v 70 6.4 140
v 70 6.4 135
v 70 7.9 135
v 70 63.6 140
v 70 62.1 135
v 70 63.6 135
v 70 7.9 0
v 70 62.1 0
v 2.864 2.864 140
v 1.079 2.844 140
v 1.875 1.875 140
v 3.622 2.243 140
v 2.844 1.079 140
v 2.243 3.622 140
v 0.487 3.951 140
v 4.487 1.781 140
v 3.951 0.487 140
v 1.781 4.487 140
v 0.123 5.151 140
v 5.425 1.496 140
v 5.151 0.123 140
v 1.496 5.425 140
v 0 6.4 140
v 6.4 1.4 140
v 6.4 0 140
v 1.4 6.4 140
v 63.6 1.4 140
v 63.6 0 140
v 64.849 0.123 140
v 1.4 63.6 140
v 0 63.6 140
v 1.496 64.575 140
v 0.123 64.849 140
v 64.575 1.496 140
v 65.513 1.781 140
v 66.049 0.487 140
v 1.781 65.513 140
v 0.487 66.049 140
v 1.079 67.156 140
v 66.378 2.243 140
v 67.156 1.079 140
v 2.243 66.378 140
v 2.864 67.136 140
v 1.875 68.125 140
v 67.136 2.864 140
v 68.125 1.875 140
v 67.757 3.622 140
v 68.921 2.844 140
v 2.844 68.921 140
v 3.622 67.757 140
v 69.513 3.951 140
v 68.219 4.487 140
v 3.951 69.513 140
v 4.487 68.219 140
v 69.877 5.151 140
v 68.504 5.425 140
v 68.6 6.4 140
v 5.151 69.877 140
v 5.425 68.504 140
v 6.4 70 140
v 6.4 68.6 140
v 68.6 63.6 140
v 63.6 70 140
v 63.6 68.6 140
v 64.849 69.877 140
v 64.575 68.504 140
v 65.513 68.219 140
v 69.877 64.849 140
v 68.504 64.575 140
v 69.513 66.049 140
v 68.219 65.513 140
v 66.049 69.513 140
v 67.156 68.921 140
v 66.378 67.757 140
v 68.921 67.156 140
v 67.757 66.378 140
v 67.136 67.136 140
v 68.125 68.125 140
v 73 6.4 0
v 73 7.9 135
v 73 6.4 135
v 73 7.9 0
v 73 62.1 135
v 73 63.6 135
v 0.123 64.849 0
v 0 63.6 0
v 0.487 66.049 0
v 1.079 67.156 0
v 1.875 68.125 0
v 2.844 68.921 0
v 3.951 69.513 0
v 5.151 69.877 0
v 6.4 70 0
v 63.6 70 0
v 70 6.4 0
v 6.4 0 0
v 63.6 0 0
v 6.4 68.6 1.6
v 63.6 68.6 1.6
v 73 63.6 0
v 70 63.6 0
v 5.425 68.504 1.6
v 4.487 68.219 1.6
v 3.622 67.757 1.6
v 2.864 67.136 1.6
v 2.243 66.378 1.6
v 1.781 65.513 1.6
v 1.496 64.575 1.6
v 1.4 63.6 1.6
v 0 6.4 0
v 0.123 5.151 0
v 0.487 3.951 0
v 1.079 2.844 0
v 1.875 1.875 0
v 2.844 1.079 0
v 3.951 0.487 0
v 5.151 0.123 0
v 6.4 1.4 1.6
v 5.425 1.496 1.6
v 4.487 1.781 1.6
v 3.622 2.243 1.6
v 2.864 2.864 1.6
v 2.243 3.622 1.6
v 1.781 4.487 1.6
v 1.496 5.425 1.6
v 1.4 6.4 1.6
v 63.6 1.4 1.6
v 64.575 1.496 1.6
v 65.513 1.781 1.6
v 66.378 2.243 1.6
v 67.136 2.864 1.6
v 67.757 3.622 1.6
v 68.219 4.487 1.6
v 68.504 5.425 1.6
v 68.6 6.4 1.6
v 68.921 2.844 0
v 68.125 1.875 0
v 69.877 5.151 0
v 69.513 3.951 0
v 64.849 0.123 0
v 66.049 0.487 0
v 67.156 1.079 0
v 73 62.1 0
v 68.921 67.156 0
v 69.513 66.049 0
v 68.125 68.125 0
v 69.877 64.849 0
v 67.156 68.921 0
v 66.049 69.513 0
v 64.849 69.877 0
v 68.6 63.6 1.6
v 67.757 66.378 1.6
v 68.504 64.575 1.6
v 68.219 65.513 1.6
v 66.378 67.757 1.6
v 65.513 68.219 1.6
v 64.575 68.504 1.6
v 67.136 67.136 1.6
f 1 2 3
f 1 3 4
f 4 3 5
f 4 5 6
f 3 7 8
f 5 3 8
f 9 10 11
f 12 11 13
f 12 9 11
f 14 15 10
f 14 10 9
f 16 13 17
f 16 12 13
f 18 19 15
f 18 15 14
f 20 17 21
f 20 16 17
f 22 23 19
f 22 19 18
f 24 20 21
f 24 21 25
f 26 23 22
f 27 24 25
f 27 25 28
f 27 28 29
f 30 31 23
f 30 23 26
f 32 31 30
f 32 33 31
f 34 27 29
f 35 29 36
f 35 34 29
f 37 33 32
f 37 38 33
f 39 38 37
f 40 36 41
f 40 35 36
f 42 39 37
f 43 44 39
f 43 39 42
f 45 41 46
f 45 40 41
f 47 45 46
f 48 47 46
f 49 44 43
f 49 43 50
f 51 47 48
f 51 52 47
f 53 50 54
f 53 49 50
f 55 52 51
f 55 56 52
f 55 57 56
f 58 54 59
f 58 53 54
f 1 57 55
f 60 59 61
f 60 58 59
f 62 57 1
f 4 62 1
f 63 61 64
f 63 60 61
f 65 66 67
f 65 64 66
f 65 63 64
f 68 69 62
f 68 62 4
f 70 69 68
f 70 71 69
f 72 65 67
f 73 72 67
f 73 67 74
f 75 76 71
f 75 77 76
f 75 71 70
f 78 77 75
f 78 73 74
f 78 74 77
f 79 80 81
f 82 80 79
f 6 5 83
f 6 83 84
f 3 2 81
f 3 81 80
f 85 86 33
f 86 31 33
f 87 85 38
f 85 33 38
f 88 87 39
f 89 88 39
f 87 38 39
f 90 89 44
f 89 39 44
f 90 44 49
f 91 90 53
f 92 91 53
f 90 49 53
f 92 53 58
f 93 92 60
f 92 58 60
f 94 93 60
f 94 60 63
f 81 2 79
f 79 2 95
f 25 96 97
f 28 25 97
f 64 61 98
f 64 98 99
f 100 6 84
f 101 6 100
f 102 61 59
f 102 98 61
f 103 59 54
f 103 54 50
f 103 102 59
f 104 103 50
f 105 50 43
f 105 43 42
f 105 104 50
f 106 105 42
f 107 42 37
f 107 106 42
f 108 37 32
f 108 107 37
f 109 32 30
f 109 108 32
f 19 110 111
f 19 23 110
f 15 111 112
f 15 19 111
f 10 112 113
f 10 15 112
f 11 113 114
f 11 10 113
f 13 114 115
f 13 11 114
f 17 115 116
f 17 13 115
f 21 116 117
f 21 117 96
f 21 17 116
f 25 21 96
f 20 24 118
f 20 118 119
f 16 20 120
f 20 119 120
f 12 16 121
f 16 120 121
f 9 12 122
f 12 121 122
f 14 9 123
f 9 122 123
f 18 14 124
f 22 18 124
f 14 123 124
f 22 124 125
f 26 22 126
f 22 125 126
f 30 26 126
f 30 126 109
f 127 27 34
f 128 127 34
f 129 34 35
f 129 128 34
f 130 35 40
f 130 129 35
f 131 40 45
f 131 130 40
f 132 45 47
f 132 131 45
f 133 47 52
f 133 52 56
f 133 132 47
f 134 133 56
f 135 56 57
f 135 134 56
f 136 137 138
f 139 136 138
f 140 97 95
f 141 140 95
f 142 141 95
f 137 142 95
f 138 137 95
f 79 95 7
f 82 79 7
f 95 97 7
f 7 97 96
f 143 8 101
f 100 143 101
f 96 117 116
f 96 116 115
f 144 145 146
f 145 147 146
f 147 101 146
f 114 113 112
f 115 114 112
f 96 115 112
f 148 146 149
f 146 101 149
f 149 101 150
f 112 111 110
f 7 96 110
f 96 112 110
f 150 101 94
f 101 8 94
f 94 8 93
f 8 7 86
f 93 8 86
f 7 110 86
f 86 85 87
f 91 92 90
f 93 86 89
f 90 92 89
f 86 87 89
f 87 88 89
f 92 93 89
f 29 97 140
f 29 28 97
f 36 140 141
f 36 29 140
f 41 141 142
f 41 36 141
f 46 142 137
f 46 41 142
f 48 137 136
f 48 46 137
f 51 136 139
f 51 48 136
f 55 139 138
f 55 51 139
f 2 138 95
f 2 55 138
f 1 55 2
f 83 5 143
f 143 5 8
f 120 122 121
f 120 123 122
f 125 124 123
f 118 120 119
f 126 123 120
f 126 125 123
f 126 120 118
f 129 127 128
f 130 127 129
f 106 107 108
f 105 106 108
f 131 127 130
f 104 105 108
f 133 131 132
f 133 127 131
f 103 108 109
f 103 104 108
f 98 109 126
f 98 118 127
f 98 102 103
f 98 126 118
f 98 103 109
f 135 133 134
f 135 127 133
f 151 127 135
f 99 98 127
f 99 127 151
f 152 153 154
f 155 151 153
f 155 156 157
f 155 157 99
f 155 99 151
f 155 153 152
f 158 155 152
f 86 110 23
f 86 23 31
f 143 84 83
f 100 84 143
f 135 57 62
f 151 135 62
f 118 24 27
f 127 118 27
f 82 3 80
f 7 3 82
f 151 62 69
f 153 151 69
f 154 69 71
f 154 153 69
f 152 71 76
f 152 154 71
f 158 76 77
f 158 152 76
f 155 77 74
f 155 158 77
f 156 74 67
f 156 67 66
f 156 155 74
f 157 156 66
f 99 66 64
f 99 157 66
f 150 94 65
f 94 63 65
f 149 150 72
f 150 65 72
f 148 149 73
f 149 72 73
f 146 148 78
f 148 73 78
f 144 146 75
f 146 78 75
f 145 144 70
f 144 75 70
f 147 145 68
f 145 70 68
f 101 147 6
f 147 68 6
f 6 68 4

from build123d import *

# Parameters (mm, degrees)
SKETCH1_W           = 70
SKETCH1_H           = 70
BOSS_EXTRUDE1_DEPTH = 140
SKETCH2_W           = 67.2
SKETCH2_H           = 67.2
CUT_EXTRUDE1_DEPTH  = 138.4
FILLET1_R           = 5
FILLET2_R           = 6.4
SKETCH3_W           = 135
SKETCH3_H           = 1.5
BOSS_EXTRUDE2_DEPTH = 3


with BuildPart() as part:
    # Sketch1 → Boss-Extrude1 (new body)
    with BuildSketch(Plane.XY):
        with Locations((35, 35)):
            Rectangle(SKETCH1_W, SKETCH1_H)
    extrude(amount=BOSS_EXTRUDE1_DEPTH)

    # Sketch2 → Cut-Extrude1 (cut)
    with BuildSketch(Plane.XY.offset(140)):
        with Locations((35, 35)):
            Rectangle(SKETCH2_W, SKETCH2_H)
    extrude(amount=-CUT_EXTRUDE1_DEPTH, mode=Mode.SUBTRACT)

    # Fillet1
    fillet1_edges = [part.edges().sort_by_distance(p)[0] for p in [
        (1.4, 1.4, 70.8),
        (1.4, 68.6, 70.8),
        (68.6, 68.6, 70.8),
        (68.6, 1.4, 70.8),
    ]]
    fillet(fillet1_edges, radius=FILLET1_R)

    # Fillet2
    fillet2_edges = [part.edges().sort_by_distance(p)[0] for p in [
        (0, 70, 70),
        (70, 70, 70),
        (70, 0, 70),
        (0, 0, 70),
    ]]
    fillet(fillet2_edges, radius=FILLET2_R)

    # Sketch3 → Boss-Extrude2 (add)
    with BuildSketch(Plane(origin=(70, 0, 0), x_dir=(0, 0, -1), z_dir=(1, 0, 0))):
        with Locations((-67.5, 7.15)):
            Rectangle(SKETCH3_W, SKETCH3_H)
        with Locations((-67.5, 62.85)):
            Rectangle(SKETCH3_W, SKETCH3_H)
    extrude(amount=BOSS_EXTRUDE2_DEPTH)


solid = part.part
